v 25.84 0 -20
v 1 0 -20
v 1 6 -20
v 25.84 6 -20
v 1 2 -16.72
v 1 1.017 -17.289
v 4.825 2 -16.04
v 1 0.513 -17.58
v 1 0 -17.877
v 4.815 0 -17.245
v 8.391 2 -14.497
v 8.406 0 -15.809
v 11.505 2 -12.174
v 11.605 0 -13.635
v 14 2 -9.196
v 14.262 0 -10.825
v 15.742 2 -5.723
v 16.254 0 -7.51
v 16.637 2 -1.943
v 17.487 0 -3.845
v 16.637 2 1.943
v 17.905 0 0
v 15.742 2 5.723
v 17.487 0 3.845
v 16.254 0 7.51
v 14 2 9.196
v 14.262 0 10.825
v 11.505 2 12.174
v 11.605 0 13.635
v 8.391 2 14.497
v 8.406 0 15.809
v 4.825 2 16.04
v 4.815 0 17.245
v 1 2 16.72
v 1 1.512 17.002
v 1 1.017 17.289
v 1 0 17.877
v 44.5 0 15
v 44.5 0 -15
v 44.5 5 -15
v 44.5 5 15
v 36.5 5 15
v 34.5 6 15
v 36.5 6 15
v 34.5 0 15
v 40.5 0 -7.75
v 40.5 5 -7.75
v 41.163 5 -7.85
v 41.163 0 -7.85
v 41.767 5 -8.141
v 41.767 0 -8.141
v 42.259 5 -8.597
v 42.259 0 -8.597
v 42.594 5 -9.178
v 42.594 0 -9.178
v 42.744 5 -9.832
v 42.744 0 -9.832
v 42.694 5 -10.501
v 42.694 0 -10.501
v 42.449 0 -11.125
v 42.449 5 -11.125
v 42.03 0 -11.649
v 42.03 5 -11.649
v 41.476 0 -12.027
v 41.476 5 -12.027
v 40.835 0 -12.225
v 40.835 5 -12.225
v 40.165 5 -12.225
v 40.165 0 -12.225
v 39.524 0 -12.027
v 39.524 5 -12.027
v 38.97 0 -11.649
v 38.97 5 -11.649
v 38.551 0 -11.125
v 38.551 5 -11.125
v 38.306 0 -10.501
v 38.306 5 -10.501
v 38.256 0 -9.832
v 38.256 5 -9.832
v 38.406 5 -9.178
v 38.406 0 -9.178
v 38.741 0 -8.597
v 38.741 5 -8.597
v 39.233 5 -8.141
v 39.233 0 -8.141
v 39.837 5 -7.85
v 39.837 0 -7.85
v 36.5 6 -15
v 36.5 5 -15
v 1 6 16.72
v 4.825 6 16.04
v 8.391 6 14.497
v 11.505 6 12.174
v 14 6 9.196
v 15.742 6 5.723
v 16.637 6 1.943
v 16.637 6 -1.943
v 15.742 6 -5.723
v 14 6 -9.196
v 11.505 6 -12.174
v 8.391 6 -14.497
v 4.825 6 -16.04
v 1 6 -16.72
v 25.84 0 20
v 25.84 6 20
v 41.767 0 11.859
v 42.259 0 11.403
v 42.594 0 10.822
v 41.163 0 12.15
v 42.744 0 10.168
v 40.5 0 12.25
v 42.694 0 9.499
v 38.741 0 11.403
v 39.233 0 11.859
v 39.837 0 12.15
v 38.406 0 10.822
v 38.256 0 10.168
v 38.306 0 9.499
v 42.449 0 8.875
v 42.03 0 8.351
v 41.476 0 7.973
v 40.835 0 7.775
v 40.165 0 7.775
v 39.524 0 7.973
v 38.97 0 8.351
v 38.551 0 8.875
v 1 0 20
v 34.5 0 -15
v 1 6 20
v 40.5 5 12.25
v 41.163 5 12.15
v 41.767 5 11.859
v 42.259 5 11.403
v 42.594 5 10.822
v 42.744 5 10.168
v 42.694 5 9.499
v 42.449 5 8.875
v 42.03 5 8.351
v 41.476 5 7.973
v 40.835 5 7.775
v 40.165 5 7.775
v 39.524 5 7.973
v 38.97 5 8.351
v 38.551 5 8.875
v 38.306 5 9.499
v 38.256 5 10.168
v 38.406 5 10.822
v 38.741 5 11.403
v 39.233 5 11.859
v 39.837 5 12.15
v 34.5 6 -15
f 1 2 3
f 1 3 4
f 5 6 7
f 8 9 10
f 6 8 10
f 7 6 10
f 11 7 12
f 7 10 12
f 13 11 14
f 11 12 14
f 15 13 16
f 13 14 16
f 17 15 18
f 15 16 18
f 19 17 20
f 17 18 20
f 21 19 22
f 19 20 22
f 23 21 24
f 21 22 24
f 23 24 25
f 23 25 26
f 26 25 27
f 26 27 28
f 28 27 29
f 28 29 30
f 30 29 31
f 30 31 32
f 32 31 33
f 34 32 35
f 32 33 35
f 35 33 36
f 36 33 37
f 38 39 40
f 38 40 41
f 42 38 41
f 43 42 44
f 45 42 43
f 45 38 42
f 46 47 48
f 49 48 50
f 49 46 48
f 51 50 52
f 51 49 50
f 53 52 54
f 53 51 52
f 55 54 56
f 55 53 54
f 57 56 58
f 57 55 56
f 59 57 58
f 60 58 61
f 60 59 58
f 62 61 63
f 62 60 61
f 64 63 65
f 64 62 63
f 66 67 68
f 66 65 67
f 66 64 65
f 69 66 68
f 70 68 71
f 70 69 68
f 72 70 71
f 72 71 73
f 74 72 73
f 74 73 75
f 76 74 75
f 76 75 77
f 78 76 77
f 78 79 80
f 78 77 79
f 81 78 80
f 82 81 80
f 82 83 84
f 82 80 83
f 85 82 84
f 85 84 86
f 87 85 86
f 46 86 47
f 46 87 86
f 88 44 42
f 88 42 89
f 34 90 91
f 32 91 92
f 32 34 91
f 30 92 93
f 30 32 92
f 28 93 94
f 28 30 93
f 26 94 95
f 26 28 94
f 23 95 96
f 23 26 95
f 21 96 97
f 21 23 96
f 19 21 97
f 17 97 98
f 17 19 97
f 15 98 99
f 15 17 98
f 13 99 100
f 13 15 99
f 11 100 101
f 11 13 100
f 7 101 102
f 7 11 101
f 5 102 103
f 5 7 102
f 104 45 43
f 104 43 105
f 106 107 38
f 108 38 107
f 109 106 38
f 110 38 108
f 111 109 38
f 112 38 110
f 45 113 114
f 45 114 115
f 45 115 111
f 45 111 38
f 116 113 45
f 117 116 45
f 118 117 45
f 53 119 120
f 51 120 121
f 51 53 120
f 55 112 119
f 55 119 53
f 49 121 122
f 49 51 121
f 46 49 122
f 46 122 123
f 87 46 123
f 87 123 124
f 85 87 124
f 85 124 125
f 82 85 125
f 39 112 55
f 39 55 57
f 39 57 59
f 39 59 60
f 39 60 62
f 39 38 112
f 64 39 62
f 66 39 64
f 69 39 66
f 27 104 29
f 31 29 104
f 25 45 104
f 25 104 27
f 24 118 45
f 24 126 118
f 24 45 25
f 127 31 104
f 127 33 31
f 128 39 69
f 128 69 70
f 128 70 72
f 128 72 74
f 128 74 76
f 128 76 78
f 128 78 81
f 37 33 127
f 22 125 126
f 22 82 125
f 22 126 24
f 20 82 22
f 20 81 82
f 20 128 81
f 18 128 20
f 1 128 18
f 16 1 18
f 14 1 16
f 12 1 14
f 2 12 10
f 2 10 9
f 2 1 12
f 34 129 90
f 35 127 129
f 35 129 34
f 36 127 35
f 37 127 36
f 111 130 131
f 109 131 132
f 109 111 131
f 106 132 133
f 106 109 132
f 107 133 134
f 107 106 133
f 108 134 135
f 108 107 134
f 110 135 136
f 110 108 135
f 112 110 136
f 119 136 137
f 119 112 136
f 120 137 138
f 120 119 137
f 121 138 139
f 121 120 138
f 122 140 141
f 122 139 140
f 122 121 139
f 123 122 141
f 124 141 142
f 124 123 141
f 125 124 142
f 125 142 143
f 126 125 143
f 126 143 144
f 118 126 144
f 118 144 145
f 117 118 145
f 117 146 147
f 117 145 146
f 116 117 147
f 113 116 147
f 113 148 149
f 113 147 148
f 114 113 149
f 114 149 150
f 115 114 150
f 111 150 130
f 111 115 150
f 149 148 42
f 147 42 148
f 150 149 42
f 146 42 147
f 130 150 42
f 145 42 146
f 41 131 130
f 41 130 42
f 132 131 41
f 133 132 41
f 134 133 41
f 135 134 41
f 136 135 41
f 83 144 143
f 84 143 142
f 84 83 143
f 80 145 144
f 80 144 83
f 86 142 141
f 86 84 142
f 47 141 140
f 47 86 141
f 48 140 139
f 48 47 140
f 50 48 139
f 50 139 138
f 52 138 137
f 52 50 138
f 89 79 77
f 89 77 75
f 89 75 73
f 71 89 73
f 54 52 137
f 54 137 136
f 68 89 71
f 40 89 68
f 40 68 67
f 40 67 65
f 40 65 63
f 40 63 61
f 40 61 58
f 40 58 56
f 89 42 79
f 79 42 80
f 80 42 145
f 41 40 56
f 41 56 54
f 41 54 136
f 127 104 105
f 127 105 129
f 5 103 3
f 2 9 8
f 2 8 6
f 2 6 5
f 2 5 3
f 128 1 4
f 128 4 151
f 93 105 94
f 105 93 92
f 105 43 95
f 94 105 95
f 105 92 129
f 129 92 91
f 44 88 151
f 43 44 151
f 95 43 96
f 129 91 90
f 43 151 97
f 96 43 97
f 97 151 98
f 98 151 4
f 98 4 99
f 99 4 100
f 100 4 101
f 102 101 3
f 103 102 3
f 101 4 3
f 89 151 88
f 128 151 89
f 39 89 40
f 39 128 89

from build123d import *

# Parameters (mm, degrees)
CROQUIS1_R              = 2.25
SALIENTE_EXTRUIR2_DEPTH = 6
CROQUIS2_W              = 8
CROQUIS2_H              = 30
CORTAR_EXTRUIR1_DEPTH   = 1


with BuildPart() as part:
    # Croquis1 → Saliente-Extruir2 (new body)
    with BuildSketch(Plane(origin=(0, 0, 0), x_dir=(1, 0, 0), z_dir=(0, 1, 0))):
        with BuildLine():
            Line((1, 20), (25.839745962, 20))
            Line((25.839745962, 20), (34.5, 15))
            Line((34.5, 15), (44.5, 15))
            Line((44.5, 15), (44.5, -15))
            Line((44.5, -15), (34.5, -15))
            Line((34.5, -15), (25.839745962, -20))
            Line((25.839745962, -20), (1, -20))
            Line((1, -20), (1, -16.720122607))
            ThreePointArc((1, -16.720122607), (16.75, 0), (1, 16.720122607))
            Line((1, 16.720122607), (1, 20))
        make_face()
        with Locations(Location((40.5, 10, 0), (0, 0, 270))):
            Circle(CROQUIS1_R, mode=Mode.SUBTRACT)
        with Locations(Location((40.5, -10, 0), (0, 0, 270))):
            Circle(CROQUIS1_R, mode=Mode.SUBTRACT)
    extrude(amount=SALIENTE_EXTRUIR2_DEPTH)

    # Croquis2 → Cortar-Extruir1 (cut)
    with BuildSketch(Plane(origin=(0, 6, 0), x_dir=(1, 0, 0), z_dir=(0, 1, 0))):
        with Locations((40.5, 0)):
            Rectangle(CROQUIS2_W, CROQUIS2_H)
    extrude(amount=-CORTAR_EXTRUIR1_DEPTH, mode=Mode.SUBTRACT)

    # Croquis3 → Cortar-Revolución1 (revolve, cut)
    with BuildSketch(Plane.XY):
        Polygon((16.75, 0), (16.75, 2), (17.904700538, 0), align=None)
    revolve(axis=Axis((0, 6, 0), (0, -1, 0)), mode=Mode.SUBTRACT)


solid = part.part
